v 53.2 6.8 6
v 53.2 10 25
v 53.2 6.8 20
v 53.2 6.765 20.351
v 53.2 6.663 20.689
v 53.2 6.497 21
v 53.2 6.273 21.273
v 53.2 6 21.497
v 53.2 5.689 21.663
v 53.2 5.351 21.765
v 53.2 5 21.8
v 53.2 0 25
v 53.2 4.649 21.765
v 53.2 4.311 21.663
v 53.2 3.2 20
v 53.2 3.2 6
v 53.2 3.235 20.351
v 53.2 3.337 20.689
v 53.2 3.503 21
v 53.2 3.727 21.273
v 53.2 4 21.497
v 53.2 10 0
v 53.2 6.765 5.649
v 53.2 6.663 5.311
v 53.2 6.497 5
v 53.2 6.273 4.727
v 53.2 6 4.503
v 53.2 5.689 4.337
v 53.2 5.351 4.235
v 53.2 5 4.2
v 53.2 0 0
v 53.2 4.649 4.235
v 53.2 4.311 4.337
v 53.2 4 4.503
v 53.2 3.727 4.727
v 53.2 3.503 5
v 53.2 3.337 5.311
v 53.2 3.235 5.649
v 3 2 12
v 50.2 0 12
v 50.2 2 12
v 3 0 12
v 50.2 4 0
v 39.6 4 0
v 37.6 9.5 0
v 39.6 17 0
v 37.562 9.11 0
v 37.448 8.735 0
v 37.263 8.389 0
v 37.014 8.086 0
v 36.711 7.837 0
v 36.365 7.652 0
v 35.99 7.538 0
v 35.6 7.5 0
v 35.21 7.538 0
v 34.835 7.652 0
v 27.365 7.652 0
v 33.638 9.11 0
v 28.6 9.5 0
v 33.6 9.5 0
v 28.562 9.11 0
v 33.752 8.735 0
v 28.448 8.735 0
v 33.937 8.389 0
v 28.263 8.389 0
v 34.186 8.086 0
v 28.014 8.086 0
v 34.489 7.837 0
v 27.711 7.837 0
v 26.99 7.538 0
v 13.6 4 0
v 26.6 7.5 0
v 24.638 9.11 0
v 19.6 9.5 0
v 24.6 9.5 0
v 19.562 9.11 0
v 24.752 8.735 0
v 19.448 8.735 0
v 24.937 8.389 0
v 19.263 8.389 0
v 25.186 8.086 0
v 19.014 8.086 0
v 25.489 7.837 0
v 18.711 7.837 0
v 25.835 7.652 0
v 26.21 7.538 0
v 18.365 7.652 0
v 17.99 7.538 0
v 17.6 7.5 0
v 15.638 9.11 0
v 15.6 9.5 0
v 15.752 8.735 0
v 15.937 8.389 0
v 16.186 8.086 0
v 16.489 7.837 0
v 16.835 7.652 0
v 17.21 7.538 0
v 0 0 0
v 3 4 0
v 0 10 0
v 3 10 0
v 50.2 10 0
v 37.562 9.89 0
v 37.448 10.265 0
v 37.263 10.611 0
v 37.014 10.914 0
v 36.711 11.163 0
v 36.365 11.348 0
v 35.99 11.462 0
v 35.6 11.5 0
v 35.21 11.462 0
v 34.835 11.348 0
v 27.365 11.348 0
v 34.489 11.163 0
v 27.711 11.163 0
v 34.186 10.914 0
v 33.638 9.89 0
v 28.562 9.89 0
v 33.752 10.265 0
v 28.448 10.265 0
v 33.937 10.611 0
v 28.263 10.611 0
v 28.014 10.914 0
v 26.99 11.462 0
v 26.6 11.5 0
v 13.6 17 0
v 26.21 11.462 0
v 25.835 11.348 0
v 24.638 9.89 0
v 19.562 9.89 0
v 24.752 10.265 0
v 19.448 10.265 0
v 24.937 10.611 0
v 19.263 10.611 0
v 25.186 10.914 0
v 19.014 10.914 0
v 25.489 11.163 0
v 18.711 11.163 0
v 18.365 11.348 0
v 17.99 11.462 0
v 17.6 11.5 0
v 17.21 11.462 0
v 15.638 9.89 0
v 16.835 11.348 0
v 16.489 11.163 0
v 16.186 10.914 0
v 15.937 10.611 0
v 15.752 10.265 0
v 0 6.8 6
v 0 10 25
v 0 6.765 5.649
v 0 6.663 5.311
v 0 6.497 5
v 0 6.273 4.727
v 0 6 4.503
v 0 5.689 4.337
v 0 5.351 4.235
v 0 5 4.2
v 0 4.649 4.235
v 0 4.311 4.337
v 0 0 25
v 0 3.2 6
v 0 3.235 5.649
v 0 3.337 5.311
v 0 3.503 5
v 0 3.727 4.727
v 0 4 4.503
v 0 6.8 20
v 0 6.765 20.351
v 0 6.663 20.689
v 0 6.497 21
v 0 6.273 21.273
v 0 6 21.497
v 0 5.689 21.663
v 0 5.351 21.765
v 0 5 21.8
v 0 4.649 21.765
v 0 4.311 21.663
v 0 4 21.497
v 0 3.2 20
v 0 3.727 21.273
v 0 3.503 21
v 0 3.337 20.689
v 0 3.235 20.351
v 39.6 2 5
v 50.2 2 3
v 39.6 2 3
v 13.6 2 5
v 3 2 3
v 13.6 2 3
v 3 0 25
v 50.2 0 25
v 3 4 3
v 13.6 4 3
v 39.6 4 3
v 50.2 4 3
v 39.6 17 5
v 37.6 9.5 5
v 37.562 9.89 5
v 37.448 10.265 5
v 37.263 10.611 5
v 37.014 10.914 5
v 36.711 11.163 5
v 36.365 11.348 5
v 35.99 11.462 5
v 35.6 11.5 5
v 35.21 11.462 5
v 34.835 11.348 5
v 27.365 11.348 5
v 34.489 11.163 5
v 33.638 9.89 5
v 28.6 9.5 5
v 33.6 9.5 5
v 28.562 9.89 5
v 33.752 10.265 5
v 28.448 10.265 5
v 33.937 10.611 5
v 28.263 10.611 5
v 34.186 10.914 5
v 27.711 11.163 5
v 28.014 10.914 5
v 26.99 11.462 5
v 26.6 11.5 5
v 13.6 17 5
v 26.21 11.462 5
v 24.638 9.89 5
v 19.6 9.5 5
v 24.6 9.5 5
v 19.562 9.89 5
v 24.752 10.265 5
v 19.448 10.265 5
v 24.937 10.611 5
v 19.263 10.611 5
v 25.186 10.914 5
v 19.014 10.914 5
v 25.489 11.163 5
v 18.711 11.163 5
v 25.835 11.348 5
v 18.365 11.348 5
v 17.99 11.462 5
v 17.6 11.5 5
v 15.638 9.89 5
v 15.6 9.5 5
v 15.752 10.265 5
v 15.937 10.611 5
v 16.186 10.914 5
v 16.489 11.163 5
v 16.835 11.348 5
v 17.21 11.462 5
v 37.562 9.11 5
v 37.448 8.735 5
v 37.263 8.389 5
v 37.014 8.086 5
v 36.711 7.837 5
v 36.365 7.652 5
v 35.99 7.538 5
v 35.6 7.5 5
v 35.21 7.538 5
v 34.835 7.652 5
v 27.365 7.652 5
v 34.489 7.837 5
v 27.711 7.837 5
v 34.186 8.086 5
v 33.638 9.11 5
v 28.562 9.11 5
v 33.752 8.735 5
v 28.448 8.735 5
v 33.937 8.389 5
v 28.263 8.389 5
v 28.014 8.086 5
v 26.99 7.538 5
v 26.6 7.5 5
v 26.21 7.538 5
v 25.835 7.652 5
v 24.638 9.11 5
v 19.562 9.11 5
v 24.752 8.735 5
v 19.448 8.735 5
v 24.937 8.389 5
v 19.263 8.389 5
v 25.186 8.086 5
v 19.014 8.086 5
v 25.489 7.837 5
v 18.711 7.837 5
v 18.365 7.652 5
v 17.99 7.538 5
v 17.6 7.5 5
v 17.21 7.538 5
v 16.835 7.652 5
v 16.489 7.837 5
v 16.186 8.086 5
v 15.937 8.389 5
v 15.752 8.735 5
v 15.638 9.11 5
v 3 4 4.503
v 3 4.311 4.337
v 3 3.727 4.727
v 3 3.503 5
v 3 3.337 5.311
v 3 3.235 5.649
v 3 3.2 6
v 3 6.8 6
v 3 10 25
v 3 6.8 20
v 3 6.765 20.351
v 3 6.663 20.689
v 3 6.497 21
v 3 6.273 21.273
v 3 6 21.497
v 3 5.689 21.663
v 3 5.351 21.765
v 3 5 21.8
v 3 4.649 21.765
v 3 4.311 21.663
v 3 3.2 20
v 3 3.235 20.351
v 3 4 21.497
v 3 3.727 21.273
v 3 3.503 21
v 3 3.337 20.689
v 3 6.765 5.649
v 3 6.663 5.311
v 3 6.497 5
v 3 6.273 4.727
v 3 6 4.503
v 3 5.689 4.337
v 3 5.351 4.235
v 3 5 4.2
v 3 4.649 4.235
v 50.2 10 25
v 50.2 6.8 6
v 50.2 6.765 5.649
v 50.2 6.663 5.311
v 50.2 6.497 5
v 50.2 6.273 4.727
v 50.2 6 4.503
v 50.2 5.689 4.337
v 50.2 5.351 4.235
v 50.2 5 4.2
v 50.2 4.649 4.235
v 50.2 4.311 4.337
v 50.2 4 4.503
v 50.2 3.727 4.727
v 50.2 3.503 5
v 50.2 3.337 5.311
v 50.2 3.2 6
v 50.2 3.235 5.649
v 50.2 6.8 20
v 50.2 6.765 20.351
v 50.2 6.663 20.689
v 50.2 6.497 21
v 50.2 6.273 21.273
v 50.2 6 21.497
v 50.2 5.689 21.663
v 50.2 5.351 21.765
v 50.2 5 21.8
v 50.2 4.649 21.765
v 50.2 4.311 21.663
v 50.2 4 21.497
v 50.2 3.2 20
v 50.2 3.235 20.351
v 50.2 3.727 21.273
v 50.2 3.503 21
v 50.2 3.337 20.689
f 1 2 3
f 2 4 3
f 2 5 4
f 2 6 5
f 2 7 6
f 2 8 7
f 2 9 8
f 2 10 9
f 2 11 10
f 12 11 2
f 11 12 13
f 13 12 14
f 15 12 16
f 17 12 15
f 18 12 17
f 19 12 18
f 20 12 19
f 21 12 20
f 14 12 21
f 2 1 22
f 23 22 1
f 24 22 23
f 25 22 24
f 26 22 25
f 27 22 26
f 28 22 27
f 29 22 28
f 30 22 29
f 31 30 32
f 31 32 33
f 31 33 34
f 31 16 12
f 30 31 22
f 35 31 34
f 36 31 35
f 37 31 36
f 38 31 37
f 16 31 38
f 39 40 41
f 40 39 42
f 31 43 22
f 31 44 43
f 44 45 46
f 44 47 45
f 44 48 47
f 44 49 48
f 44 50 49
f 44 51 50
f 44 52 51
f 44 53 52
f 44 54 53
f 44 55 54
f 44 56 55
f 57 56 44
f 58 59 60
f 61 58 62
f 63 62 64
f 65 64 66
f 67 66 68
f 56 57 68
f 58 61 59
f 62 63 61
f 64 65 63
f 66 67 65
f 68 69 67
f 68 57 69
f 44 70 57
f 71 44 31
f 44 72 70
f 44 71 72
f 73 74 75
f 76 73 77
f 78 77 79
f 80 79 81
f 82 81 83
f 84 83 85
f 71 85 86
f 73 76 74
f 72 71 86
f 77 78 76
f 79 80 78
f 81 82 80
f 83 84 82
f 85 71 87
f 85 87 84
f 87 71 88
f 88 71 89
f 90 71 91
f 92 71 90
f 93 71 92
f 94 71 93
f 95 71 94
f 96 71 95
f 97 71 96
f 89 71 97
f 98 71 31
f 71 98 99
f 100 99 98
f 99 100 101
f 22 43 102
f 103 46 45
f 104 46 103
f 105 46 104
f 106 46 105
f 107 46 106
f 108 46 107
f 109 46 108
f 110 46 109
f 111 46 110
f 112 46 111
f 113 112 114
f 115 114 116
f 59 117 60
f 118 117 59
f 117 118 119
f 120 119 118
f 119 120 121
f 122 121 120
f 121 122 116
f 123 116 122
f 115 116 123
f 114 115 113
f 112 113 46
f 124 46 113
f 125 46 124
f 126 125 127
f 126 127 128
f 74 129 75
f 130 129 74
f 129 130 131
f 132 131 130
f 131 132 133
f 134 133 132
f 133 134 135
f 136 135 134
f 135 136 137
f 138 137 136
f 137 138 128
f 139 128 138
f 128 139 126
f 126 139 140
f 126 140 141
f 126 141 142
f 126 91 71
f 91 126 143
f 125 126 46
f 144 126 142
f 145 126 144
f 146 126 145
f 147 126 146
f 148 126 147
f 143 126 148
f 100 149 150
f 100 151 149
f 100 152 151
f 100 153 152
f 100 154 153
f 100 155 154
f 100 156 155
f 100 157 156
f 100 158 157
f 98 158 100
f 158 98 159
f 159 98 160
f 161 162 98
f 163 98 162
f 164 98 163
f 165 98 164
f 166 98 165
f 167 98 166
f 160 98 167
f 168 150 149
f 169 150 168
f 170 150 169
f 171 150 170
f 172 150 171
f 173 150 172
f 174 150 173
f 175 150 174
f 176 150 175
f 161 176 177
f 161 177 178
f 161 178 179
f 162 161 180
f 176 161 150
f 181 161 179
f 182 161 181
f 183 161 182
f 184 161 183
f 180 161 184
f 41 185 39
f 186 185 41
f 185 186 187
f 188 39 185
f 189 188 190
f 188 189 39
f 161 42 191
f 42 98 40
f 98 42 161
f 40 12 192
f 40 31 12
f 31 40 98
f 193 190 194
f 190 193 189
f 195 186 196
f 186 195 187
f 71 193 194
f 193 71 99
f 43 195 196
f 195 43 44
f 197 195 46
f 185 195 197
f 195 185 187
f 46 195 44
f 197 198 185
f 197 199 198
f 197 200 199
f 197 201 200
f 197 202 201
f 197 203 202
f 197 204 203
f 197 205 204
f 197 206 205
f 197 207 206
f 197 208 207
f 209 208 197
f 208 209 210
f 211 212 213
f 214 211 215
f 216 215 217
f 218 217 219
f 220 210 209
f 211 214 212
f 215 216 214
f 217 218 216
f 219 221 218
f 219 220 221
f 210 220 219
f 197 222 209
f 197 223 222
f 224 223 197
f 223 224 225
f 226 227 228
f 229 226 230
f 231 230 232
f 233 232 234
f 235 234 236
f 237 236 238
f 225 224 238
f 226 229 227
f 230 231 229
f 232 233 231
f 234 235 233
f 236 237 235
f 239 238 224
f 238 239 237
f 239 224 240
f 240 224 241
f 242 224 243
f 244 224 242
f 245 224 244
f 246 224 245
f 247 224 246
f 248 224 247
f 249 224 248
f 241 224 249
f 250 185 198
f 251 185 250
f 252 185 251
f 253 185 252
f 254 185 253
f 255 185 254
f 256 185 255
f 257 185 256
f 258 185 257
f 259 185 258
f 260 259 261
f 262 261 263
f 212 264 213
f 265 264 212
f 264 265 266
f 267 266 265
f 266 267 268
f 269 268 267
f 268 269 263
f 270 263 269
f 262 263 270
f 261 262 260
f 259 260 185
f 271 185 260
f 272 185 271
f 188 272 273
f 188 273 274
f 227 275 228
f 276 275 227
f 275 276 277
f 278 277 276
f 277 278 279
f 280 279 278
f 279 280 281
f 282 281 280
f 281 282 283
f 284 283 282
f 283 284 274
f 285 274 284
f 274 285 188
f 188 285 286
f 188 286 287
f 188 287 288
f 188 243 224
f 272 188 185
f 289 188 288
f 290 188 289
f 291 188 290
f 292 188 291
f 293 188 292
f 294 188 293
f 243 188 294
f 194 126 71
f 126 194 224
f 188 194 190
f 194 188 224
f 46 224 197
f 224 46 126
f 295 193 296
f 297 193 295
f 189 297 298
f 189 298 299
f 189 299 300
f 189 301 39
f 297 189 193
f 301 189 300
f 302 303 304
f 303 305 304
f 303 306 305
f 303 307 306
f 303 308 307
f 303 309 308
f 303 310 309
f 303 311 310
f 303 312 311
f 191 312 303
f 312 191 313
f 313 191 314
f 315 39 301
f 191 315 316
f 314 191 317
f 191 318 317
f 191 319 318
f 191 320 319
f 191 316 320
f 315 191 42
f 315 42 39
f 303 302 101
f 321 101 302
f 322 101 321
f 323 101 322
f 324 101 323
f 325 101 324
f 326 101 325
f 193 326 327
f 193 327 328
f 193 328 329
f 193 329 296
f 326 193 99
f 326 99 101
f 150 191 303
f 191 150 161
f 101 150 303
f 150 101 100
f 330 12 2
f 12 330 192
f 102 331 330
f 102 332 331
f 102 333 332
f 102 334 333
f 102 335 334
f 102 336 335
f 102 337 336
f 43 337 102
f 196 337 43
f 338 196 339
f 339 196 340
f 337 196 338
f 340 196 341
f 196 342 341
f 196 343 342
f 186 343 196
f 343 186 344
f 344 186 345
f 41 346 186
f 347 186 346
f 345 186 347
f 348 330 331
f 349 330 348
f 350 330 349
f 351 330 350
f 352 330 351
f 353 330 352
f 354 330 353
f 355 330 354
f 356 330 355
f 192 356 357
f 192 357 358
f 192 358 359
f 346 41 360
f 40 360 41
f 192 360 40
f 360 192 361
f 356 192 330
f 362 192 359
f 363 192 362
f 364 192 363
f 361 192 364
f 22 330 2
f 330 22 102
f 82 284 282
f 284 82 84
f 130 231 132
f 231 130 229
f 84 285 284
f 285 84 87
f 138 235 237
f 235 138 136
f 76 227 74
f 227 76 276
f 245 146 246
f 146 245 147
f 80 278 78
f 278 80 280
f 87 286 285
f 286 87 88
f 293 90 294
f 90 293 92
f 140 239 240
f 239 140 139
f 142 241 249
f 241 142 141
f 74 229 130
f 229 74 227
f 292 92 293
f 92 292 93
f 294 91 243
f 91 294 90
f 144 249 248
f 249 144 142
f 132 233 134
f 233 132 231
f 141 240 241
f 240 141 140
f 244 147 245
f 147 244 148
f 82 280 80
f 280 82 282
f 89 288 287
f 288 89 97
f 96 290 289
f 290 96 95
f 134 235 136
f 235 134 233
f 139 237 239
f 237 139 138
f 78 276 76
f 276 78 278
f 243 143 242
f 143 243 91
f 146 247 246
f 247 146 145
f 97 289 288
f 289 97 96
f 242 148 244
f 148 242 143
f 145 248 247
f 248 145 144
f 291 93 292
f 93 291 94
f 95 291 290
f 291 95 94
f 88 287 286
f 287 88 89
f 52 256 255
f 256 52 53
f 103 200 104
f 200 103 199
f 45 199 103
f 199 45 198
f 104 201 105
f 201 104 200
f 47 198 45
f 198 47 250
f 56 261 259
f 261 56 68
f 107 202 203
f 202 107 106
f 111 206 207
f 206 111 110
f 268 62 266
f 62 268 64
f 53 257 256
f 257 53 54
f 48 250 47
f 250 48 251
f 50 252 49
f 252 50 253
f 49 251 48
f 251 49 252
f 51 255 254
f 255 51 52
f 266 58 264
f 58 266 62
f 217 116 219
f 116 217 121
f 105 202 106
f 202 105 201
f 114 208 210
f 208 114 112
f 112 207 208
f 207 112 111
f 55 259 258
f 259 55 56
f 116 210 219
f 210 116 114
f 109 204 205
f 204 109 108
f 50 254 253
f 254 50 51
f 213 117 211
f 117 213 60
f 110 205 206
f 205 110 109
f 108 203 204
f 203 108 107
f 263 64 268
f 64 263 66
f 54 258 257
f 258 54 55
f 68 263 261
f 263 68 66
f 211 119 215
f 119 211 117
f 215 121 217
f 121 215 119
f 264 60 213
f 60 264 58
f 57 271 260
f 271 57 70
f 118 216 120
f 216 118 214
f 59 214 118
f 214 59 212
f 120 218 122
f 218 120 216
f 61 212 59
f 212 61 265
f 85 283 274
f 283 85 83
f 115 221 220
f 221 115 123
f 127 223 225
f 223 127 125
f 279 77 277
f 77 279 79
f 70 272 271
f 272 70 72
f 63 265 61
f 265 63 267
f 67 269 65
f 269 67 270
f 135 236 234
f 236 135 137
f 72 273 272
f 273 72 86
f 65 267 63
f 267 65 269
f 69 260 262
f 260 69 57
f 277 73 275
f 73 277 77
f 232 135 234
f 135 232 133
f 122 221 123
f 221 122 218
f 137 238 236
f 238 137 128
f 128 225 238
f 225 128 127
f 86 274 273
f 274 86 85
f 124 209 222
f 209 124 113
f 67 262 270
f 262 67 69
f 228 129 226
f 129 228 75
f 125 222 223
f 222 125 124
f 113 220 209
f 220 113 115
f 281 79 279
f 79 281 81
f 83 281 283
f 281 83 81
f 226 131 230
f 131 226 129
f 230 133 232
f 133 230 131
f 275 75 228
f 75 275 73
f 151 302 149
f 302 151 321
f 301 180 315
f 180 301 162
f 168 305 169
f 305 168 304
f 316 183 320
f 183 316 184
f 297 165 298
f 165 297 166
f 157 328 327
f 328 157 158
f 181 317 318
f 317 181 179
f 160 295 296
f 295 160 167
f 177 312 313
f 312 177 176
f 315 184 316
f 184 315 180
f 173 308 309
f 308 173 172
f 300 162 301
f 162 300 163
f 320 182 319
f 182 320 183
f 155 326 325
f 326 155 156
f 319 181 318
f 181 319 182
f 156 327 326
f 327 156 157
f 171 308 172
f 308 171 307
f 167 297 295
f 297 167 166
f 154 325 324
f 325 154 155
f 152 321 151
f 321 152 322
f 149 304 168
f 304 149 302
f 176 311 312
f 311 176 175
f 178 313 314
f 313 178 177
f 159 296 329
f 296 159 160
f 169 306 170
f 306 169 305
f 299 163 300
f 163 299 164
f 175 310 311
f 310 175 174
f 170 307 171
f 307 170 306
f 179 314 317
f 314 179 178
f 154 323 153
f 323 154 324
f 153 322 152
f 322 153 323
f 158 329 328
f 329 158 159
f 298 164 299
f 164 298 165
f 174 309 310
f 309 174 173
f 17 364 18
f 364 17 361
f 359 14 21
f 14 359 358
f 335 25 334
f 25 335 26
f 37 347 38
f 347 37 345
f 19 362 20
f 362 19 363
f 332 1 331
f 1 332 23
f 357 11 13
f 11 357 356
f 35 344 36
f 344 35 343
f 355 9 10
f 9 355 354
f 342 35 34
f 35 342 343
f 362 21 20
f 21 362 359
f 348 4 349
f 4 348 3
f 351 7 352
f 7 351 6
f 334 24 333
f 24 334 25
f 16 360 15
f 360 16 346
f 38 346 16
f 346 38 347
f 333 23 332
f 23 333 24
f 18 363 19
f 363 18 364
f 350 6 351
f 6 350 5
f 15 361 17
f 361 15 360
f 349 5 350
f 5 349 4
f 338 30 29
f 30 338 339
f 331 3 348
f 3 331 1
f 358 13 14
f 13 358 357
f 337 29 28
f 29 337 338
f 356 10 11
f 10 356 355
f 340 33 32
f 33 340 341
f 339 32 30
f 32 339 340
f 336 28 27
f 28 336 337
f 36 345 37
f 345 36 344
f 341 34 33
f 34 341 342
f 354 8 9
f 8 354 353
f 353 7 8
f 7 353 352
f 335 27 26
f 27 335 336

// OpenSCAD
$fn=32;
//w=47.0;
// By math this is 54, but need some clearance  
w=53.2;
tw=26;
th=17;
tabh=5;
h=12;
touchw = 18;
touchhole=2;

attachthick=3;
attachdepth=10;
attachheight=25;
slotr=1.8;
slotl=14;
module slot(r,l) {
 hull() {
        translate([-.1,0,0]) 
   rotate([0,90,0])
    cylinder(r=r,h=5);
        translate([-.1,0,l]) 
   rotate([0,90,0])
    cylinder(r=r,h=5);
    };
};
    
difference() {
    union() {cube([w,2,h]);
cube([w,4,3]);
translate([(w/2)-(tw/2),0,0]) 
  cube([tw,th,tabh]);
  
translate([0,0,0]) 
   cube([attachthick,attachdepth,attachheight]);
translate([w-attachthick,0,0]) 
   cube([attachthick,attachdepth,attachheight]);
    };
    translate([(w/2)-(touchw/2),1+th/2,-0.1]) 
      cylinder(r=touchhole, h=tabh+0.2);
    translate([(w/2)+(touchw/2),1+th/2,-0.1]) 
      cylinder(r=touchhole, h=tabh+0.2);
    translate([(w/2),1+th/2,-0.1]) 
      cylinder(r=touchhole, h=tabh+0.2);
 // slots
        translate([-.1,5,6]) 
                slot(slotr,slotl);
 //       translate([-.1,14,4]) 
 //               slot(slotr,slotl);
        translate([w-attachthick-.1,5,6]) 
                slot(slotr,slotl);
 //       translate([w-attachthick-.1,14,4]) 
 //               slot(slotr,slotl);
    
    
};
